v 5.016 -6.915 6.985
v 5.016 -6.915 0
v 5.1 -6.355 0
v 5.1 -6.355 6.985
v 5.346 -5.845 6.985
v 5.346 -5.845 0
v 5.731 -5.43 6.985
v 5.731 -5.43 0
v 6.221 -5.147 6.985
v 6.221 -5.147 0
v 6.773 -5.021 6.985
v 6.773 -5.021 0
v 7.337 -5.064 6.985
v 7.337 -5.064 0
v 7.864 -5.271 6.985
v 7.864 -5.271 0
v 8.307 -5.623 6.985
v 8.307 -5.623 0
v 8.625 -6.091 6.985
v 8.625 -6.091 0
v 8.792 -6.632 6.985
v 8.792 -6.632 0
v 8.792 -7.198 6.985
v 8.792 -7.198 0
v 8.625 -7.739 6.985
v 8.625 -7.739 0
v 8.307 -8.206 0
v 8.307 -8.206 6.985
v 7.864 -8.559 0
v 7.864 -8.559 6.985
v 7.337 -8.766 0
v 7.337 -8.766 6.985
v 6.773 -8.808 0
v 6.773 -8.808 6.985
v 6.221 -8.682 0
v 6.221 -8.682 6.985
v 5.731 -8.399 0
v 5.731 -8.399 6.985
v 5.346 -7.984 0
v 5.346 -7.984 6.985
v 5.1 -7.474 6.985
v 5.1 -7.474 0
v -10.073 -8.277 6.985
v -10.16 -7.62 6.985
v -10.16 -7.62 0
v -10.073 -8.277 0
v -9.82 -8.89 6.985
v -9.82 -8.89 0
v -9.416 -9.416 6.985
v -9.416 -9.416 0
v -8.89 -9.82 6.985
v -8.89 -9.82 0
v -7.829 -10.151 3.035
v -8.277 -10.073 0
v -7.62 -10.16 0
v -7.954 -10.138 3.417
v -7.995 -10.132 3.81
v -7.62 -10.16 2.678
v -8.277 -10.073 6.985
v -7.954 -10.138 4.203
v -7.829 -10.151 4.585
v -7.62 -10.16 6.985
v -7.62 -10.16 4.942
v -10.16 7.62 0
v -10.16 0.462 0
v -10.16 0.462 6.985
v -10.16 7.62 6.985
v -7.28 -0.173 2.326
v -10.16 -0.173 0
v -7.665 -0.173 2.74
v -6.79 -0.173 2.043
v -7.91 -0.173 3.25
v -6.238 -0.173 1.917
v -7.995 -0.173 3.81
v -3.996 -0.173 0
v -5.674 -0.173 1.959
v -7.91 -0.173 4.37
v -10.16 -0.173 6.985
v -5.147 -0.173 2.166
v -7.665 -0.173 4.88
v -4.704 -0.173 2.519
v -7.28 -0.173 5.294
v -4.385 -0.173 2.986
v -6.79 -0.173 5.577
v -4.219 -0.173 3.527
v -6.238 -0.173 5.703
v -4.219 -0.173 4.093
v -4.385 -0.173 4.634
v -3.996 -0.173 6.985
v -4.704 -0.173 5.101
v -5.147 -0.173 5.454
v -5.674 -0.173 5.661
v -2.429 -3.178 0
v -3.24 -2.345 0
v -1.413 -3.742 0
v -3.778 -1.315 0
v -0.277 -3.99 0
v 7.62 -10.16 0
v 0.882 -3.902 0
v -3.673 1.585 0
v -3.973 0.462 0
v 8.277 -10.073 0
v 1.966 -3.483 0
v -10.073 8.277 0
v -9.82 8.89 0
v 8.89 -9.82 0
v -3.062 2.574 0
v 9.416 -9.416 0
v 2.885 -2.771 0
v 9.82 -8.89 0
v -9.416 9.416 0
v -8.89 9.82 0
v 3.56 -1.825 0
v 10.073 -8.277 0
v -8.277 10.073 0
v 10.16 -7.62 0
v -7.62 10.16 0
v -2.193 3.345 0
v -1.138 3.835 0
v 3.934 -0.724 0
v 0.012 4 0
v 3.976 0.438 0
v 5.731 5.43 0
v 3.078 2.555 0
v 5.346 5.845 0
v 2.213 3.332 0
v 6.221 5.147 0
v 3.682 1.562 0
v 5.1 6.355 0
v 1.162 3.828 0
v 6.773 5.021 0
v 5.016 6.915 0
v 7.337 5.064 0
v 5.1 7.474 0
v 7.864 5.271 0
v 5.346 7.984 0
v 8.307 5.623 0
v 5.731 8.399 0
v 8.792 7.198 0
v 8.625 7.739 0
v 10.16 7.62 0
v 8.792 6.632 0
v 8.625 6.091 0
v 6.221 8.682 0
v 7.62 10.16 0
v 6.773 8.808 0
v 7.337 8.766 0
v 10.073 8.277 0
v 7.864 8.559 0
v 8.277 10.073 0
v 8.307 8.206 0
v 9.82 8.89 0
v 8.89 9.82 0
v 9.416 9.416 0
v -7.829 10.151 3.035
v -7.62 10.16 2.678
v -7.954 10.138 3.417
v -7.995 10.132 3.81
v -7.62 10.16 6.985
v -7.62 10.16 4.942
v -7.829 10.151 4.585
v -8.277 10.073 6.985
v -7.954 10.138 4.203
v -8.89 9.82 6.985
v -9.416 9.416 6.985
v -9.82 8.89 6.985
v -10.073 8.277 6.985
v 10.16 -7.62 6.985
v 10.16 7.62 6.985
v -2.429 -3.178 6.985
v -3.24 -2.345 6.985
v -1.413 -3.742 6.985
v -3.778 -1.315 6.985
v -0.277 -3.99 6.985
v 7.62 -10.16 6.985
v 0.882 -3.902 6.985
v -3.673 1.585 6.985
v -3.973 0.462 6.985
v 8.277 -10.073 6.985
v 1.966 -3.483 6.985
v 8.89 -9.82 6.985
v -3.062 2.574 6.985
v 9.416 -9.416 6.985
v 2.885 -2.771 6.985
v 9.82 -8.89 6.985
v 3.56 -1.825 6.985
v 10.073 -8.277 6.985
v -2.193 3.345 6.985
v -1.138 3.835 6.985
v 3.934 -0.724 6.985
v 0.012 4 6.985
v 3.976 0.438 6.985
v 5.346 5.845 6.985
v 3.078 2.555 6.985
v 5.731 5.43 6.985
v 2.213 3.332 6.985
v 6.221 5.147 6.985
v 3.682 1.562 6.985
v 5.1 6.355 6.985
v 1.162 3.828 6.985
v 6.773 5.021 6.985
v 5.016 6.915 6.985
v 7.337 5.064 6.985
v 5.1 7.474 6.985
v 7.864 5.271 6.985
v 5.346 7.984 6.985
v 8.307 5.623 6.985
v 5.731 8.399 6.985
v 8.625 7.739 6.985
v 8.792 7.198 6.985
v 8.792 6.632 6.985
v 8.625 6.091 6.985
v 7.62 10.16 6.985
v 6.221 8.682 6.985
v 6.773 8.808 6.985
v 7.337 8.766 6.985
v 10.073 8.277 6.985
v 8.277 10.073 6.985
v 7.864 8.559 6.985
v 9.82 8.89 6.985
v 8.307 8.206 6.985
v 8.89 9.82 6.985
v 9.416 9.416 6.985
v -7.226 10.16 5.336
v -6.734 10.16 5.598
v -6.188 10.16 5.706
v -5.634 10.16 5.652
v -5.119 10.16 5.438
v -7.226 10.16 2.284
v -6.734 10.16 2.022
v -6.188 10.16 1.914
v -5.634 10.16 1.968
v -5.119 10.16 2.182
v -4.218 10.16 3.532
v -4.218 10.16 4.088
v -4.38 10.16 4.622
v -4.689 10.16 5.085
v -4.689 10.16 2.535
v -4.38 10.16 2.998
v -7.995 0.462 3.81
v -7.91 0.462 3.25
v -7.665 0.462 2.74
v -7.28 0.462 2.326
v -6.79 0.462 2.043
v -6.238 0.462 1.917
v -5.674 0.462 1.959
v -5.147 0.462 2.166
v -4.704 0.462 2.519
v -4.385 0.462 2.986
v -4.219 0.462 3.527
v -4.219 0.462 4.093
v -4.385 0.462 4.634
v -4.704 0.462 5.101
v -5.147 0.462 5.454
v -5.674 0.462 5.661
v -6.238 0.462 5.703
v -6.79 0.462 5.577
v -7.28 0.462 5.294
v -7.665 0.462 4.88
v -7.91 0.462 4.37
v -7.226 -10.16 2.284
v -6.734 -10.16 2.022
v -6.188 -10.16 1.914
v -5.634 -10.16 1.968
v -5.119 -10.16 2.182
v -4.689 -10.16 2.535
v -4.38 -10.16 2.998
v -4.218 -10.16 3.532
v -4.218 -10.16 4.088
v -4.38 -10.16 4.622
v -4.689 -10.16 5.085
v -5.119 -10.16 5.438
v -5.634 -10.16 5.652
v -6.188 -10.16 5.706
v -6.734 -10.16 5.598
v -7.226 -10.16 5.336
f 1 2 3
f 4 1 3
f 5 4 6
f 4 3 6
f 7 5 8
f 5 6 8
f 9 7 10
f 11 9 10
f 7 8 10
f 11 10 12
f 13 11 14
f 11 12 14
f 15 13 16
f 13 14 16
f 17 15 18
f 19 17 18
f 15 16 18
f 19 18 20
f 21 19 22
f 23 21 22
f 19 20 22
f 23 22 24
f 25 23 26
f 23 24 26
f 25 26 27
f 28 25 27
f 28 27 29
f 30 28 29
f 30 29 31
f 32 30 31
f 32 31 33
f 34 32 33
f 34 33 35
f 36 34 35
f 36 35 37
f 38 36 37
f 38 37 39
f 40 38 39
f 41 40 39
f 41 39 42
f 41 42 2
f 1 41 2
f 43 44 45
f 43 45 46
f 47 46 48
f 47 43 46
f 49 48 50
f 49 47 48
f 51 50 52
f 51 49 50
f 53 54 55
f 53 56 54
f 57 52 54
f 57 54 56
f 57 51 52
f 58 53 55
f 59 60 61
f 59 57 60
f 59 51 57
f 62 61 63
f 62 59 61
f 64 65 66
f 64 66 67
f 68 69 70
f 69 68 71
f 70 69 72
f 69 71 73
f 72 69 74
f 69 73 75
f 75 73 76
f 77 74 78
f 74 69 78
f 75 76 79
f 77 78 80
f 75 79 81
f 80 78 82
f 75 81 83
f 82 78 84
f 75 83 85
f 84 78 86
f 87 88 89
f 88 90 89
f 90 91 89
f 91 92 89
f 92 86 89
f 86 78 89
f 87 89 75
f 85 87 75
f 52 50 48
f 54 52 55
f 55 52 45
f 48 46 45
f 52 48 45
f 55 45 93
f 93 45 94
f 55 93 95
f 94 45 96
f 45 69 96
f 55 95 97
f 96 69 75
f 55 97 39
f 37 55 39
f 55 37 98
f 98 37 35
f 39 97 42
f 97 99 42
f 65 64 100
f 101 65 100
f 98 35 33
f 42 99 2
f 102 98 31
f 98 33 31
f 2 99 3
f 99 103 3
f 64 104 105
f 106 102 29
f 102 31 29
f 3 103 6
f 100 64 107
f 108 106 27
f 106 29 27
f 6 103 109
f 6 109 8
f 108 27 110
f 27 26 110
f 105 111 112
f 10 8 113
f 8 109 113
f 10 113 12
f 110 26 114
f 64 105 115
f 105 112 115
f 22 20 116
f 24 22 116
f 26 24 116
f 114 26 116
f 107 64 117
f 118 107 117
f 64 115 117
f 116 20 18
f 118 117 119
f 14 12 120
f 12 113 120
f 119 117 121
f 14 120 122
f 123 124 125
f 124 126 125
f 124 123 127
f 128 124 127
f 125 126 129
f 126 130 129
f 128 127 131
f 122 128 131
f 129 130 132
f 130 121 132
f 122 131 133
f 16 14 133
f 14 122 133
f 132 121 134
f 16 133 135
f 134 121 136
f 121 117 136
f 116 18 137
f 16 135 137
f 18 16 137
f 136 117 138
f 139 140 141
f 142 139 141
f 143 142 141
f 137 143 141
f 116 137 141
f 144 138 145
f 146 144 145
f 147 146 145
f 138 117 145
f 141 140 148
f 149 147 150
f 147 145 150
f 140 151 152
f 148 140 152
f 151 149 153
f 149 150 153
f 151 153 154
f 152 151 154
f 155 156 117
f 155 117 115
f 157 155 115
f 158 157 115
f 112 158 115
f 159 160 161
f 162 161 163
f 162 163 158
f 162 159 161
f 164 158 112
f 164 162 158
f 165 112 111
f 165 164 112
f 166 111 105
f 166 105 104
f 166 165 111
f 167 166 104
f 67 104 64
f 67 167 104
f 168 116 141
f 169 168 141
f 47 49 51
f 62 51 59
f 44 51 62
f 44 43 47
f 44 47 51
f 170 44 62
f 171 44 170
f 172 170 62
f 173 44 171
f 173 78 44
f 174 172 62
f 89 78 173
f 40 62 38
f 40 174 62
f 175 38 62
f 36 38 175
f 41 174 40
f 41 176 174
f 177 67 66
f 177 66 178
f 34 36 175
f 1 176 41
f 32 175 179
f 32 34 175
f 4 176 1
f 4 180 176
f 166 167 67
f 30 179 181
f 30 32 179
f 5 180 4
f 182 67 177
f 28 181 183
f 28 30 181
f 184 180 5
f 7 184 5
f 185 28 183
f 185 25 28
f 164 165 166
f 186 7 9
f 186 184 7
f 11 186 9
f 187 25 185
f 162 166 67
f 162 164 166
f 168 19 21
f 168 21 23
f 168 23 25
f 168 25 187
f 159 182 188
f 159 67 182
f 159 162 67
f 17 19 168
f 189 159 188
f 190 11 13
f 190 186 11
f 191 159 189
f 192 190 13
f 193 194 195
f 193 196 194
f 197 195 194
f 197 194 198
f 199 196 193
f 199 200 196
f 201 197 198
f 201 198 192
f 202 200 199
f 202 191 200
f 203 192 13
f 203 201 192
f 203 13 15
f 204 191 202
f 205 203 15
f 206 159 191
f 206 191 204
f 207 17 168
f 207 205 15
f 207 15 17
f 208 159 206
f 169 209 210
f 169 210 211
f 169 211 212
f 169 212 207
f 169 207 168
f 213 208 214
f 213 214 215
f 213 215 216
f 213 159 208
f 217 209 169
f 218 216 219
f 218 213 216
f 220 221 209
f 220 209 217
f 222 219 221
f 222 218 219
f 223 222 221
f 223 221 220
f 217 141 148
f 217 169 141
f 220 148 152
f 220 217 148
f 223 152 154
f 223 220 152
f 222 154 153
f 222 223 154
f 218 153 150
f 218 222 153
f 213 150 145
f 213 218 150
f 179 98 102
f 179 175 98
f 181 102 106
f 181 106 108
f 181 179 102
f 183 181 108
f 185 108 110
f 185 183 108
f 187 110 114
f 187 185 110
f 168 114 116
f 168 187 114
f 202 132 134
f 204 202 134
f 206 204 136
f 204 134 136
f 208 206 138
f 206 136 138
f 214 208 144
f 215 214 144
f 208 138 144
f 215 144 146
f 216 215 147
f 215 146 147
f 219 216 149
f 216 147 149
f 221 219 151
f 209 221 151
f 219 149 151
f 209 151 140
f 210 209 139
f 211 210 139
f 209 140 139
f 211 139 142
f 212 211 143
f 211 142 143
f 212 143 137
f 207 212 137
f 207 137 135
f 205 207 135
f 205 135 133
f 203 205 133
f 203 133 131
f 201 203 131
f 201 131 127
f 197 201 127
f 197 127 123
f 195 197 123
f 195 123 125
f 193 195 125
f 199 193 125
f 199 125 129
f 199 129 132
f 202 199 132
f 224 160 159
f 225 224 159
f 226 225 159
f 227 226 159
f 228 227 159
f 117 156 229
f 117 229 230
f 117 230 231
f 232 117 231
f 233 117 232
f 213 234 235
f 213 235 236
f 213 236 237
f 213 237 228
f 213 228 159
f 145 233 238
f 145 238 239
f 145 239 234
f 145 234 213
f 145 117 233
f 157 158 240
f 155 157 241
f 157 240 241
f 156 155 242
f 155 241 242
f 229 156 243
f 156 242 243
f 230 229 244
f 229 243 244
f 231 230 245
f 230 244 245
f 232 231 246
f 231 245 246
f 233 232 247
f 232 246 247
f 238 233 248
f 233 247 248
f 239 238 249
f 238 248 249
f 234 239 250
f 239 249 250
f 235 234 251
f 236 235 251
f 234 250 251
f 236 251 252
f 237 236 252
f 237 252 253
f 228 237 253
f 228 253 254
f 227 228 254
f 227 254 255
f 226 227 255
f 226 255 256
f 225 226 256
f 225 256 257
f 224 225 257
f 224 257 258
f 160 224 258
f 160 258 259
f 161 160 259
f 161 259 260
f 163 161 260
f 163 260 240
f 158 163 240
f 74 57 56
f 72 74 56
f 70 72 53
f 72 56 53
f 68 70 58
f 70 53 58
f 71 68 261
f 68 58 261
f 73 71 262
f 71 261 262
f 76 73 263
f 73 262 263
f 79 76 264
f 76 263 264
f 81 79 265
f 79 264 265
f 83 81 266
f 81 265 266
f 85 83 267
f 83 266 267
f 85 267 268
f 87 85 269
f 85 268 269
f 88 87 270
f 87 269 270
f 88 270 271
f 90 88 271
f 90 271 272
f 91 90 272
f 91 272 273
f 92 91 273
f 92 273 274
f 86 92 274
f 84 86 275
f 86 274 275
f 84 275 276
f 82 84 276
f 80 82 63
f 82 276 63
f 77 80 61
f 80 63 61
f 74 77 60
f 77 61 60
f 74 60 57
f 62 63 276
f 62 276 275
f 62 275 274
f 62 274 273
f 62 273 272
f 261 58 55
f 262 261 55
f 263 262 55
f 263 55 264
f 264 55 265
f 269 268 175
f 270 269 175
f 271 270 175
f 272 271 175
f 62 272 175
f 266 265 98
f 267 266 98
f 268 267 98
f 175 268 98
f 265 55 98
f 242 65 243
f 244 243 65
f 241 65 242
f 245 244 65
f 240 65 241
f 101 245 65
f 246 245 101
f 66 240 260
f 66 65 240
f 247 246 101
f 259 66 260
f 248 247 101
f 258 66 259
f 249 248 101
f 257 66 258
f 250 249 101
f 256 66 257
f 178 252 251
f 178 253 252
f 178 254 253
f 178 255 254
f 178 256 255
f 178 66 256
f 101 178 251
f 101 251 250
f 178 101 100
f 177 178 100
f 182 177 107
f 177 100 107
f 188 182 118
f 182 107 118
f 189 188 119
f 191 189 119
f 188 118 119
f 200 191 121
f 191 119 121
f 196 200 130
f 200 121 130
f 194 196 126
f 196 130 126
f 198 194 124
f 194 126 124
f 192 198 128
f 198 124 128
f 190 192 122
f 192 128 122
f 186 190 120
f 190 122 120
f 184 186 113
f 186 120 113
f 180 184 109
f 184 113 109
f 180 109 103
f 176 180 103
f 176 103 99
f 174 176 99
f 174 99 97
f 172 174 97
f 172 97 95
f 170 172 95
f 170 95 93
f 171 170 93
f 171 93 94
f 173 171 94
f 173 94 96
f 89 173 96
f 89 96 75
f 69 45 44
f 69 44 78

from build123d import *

# Parameters (mm, degrees)
SKETCH1_W                 = 20.32
SKETCH1_H                 = 20.32
BOSS_EXTRUDE1_DEPTH       = 6.985
SKETCH5_W                 = 22.86
SKETCH5_H                 = 0.635
CUT_EXTRUDE3_DEPTH        = 1
CUT_EXTRUDE3_DEPTH_BACK   = 7.985
F_6_CLEARANCE_HOLE1_D     = 3.7973
F_6_CLEARANCE_HOLE1_DEPTH = 6.985
FILLET1_R                 = 2.54
F_8_0MM_DOWEL_HOLE1_D     = 8
F_8_0MM_DOWEL_HOLE1_DEPTH = 6.985
F_6_CLEARANCE_HOLE2_D     = 3.7973


with BuildPart() as part:
    # Sketch1 → Boss-Extrude1 (new body)
    with BuildSketch(Plane.XY):
        Rectangle(SKETCH1_W, SKETCH1_H)
    extrude(amount=BOSS_EXTRUDE1_DEPTH)

    # Sketch5 → Cut-Extrude3 (cut, two sides)
    with BuildSketch(Plane.XY.offset(6.985)) as cut_extrude3_sk:
        with Locations((-15.137429848, 0.144302155)):
            Rectangle(SKETCH5_W, SKETCH5_H)
    extrude(amount=CUT_EXTRUDE3_DEPTH, mode=Mode.SUBTRACT)
    extrude(cut_extrude3_sk.sketch, amount=-CUT_EXTRUDE3_DEPTH_BACK, mode=Mode.SUBTRACT)

    # #6 Clearance Hole1
    with Locations(Plane.XY.offset(6.985)):
        with Locations((6.914797213, 6.914797213), (6.914797213, -6.914797213)):
            Hole(F_6_CLEARANCE_HOLE1_D / 2, depth=F_6_CLEARANCE_HOLE1_DEPTH)

    # Fillet1
    fillet1_edges = [part.edges().sort_by_distance(p)[0] for p in [
        (10.16, -10.16, 3.4925),
        (-10.16, -10.16, 3.4925),
        (-10.16, 10.16, 3.4925),
        (10.16, 10.16, 3.4925),
    ]]
    fillet(fillet1_edges, radius=FILLET1_R)

    # Ø8.0mm Dowel Hole1
    with Locations(Plane.XY.offset(6.985)):
        with Locations((0, 0)):
            Hole(F_8_0MM_DOWEL_HOLE1_D / 2, depth=F_8_0MM_DOWEL_HOLE1_DEPTH)

    # #6 Clearance Hole2 (through all)
    with Locations(Plane(origin=(0, 10.16, 0), x_dir=(1, 0, 0), z_dir=(0, 1, 0))):
        with Locations((-6.096, -3.81)):
            Hole(F_6_CLEARANCE_HOLE2_D / 2)


solid = part.part
